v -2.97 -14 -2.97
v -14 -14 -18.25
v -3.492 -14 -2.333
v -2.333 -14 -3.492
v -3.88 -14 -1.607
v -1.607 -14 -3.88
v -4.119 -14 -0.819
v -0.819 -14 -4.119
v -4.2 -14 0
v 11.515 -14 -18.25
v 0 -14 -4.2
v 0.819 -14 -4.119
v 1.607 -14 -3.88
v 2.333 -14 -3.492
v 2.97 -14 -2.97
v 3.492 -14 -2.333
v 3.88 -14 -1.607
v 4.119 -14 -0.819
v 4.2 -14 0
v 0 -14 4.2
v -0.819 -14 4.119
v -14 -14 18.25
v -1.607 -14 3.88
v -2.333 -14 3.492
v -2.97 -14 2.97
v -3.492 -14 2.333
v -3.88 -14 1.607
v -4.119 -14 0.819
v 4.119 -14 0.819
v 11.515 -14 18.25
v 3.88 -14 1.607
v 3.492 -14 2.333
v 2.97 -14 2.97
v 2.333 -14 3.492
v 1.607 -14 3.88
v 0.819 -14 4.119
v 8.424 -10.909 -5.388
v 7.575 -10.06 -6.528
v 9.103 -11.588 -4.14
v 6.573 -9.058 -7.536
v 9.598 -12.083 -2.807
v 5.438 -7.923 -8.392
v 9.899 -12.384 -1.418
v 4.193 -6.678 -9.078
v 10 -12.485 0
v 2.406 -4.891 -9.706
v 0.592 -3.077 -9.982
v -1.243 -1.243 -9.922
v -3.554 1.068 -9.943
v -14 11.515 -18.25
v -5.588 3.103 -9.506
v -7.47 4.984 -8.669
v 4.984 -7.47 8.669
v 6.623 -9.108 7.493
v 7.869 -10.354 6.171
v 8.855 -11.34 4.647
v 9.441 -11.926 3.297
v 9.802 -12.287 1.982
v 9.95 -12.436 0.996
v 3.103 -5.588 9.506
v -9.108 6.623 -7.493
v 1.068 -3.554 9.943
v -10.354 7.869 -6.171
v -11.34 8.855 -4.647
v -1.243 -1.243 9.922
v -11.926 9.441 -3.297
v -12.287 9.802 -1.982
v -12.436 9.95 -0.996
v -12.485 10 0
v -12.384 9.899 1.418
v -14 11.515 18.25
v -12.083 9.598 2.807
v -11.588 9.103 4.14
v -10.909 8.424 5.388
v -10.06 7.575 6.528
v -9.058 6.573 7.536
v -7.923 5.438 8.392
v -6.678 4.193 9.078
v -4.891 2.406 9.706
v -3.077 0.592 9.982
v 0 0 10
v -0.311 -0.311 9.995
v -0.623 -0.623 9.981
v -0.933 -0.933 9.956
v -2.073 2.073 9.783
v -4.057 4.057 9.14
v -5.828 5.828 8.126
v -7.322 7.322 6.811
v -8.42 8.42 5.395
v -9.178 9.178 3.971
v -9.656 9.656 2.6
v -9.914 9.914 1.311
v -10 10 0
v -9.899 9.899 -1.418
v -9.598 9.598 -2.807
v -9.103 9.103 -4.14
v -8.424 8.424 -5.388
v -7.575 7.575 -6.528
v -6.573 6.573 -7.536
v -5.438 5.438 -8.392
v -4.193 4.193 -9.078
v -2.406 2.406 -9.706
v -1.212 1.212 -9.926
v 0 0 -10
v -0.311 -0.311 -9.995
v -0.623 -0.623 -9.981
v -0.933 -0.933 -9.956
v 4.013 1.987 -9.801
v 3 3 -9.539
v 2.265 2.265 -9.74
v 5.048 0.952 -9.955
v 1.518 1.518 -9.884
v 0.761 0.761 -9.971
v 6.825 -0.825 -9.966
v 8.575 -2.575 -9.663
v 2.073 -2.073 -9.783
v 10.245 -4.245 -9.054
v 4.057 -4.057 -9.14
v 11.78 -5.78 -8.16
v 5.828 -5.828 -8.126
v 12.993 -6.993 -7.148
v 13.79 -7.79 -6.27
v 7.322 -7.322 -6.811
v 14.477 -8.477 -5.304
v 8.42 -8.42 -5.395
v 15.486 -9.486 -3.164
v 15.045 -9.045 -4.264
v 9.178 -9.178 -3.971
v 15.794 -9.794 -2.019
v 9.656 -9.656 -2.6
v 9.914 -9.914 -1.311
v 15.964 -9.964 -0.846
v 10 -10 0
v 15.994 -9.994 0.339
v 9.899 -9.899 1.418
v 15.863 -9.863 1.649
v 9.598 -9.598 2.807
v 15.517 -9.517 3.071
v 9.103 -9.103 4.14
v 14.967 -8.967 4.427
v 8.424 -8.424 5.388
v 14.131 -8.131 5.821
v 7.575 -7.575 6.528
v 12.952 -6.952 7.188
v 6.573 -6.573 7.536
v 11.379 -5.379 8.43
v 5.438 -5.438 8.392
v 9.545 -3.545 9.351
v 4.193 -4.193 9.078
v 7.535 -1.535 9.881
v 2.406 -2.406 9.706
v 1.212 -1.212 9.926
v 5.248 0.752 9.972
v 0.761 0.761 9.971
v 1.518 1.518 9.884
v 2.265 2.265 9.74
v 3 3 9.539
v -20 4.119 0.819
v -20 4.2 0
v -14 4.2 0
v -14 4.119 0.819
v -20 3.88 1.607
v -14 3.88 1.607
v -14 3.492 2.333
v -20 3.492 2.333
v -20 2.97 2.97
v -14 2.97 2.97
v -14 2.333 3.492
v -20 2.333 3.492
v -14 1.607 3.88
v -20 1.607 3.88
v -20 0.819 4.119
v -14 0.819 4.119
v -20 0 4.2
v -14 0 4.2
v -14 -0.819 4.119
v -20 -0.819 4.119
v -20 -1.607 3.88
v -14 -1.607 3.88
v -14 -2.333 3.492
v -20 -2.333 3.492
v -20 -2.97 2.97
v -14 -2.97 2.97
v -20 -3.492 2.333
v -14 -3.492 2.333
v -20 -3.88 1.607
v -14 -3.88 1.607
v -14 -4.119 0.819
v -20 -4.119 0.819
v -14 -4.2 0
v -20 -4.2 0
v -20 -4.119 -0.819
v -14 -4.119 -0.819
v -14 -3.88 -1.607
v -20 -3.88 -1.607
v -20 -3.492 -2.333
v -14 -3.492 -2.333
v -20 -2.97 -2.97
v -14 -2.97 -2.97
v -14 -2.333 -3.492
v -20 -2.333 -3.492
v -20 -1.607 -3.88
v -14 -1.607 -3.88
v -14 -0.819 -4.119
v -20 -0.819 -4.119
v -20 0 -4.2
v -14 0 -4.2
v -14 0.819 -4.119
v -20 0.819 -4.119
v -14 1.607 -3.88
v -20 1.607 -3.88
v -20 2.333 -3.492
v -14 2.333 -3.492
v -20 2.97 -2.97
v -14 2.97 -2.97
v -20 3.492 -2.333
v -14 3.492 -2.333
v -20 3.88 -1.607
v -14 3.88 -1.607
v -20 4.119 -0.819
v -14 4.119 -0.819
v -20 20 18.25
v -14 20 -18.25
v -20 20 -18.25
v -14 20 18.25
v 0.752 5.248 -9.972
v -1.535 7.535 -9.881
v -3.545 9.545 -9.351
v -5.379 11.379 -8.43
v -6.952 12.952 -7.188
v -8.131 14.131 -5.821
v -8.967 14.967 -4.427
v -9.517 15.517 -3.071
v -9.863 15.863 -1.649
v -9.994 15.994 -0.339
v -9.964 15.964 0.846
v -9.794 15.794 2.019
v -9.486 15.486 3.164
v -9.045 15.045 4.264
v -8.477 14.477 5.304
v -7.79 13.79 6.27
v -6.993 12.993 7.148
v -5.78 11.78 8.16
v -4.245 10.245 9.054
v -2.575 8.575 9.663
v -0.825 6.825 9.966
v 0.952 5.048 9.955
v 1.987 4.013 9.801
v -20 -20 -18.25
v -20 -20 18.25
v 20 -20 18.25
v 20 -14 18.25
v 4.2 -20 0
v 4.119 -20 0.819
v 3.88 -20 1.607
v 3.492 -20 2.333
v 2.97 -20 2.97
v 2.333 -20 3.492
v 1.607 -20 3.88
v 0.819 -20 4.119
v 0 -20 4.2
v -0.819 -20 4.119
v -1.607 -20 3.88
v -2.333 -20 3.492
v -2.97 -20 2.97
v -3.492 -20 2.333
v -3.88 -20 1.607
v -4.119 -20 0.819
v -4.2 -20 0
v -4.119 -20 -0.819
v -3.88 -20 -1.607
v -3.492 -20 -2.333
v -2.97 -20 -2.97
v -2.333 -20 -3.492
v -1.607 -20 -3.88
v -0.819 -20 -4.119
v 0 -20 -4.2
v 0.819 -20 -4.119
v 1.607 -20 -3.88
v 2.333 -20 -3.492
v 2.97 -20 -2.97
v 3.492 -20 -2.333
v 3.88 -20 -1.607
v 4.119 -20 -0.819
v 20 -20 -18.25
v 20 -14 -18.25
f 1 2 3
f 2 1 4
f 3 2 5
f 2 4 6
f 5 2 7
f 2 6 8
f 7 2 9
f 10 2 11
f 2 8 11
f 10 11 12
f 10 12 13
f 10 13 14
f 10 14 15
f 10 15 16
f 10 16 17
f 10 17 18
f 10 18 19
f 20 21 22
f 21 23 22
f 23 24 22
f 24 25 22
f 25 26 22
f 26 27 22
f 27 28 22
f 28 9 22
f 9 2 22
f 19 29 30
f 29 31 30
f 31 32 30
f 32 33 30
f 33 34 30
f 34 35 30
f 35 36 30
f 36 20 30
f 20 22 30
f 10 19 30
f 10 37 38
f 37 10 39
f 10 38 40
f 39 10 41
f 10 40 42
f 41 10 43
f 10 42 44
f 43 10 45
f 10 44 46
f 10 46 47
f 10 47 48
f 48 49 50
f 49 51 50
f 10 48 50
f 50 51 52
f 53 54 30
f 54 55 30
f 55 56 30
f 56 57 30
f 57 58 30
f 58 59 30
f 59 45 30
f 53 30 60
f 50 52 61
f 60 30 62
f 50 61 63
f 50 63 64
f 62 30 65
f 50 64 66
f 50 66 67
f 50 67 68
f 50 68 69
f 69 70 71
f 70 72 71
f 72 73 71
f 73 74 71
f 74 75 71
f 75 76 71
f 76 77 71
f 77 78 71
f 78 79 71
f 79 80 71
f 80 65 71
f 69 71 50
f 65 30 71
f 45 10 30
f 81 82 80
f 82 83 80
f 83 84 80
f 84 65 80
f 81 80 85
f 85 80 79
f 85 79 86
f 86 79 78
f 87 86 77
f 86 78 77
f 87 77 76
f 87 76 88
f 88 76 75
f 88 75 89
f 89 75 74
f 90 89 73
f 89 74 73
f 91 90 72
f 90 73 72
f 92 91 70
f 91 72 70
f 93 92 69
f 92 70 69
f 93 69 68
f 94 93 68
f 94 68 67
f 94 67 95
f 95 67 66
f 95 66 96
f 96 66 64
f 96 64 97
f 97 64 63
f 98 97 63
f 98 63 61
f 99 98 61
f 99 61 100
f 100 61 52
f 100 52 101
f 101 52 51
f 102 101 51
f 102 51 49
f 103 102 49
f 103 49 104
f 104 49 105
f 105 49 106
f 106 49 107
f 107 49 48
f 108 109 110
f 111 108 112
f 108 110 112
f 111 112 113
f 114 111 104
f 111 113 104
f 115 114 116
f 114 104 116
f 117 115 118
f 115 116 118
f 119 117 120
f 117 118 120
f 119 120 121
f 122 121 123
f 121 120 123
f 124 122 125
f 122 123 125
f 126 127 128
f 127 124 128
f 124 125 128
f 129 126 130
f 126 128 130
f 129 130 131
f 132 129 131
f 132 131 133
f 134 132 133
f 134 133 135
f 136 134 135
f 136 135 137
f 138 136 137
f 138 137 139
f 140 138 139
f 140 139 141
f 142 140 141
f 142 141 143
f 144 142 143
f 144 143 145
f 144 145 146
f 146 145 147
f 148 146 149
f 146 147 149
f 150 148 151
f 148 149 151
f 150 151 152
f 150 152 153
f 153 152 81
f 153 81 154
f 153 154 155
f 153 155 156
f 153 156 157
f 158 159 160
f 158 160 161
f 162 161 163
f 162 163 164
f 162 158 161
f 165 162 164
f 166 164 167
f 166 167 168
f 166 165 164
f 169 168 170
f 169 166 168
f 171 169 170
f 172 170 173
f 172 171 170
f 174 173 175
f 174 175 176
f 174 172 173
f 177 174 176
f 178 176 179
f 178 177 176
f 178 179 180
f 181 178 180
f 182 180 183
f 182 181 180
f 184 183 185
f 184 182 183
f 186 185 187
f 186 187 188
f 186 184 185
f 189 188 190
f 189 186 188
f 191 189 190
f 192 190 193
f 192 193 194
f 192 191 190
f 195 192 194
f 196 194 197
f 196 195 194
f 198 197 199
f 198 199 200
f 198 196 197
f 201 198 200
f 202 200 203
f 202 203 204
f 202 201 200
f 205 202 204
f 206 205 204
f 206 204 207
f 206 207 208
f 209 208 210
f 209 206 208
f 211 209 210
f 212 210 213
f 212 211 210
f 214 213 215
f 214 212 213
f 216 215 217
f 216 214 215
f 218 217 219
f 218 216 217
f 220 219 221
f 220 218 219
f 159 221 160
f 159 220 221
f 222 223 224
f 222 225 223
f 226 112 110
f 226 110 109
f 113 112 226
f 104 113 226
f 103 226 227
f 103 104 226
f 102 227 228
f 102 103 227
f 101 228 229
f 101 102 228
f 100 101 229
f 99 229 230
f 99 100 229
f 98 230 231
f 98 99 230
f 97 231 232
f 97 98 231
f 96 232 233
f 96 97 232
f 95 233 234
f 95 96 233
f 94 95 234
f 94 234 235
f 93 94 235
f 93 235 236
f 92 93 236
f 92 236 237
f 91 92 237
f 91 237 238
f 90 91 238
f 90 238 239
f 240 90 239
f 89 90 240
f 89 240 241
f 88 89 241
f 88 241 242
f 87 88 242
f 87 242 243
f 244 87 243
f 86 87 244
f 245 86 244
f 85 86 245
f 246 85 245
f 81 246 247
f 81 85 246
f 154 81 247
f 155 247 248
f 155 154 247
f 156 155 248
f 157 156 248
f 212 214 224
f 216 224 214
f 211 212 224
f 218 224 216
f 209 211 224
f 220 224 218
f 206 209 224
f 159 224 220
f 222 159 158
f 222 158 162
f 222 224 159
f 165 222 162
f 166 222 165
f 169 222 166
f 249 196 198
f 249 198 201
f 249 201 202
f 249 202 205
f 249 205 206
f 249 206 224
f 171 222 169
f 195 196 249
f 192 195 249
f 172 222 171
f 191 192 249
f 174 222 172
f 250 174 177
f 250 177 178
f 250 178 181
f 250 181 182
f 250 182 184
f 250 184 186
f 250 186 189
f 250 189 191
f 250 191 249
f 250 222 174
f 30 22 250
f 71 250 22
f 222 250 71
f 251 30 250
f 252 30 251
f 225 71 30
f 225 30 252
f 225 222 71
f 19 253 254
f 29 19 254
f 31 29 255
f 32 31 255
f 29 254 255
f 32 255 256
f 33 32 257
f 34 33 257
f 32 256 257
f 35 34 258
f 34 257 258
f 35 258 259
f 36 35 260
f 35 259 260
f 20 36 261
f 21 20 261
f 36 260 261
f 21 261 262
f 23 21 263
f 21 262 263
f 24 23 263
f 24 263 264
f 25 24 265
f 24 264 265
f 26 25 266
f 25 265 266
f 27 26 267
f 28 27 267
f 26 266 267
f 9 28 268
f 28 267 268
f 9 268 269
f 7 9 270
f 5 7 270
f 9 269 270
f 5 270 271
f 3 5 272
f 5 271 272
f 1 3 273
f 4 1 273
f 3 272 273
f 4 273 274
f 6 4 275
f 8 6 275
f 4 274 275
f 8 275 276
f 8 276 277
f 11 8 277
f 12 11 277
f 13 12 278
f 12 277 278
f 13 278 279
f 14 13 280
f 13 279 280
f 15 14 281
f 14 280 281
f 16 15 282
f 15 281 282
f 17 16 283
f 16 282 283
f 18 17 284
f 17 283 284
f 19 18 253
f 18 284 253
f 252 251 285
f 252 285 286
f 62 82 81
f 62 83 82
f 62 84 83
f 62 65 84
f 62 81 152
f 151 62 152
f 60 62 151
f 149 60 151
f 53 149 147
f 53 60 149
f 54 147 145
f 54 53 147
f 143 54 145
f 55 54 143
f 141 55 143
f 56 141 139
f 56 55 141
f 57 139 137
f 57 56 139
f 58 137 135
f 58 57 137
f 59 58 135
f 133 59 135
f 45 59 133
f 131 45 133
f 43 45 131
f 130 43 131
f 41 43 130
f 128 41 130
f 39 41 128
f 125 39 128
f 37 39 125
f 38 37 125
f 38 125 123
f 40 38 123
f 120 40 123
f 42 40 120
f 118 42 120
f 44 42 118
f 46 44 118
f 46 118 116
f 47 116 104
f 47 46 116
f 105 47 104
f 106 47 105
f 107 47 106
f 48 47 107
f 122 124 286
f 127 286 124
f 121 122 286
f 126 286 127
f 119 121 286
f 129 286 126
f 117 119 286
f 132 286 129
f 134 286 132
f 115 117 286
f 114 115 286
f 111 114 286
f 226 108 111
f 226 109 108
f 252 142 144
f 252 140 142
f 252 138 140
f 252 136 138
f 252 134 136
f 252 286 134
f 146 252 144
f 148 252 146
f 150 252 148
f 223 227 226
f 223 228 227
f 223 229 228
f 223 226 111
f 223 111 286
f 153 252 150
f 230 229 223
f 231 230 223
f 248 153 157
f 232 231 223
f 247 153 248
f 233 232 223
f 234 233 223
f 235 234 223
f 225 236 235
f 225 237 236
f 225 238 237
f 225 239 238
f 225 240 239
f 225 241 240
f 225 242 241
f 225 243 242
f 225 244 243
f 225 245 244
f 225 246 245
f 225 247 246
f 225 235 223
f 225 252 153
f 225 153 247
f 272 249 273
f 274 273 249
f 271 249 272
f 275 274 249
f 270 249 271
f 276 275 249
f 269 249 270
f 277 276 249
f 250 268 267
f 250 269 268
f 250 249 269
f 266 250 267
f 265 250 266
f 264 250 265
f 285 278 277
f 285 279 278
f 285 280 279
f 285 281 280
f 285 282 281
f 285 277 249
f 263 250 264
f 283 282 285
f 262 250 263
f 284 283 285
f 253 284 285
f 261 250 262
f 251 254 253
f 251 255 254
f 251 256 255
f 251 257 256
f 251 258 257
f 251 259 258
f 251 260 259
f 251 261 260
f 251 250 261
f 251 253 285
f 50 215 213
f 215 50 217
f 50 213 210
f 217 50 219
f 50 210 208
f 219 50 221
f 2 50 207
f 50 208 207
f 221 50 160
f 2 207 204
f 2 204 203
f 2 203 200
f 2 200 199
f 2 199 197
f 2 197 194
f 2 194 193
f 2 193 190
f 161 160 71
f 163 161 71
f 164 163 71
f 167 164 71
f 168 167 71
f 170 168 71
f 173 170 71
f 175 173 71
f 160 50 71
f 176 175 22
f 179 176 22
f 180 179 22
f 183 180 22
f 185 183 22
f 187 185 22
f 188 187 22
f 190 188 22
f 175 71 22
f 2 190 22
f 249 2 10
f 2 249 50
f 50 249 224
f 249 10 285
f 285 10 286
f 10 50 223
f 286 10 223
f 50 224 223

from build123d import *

# Parameters (mm, degrees)
BOSS_EXTRUDE1_DEPTH      = 18.25
BOSS_EXTRUDE1_DEPTH_BACK = 18.25
SKETCH4_R                = 4.2
CUT_EXTRUDE1_DEPTH       = 6
SKETCH6_R                = 10
CUT_EXTRUDE2_DEPTH       = 35


with BuildPart() as part:
    # Sketch2 → Boss-Extrude1 (new body, two sides)
    with BuildSketch(Plane.XY) as boss_extrude1_sk:
        Polygon((-20, 20), (-20, -20), (20, -20), (20, -14), (-14, 20), align=None)
        Polygon((-14, 11.514718626), (-14, -14), (11.514718626, -14), align=None, mode=Mode.SUBTRACT)
    extrude(amount=BOSS_EXTRUDE1_DEPTH)
    extrude(boss_extrude1_sk.sketch, amount=-BOSS_EXTRUDE1_DEPTH_BACK)

    # Sketch4 → Cut-Extrude1 (cut)
    with BuildSketch(Plane.XZ.offset(20)):
        Circle(SKETCH4_R)
    cut_extrude1 = extrude(amount=-CUT_EXTRUDE1_DEPTH, mode=Mode.SUBTRACT)

    # Sketch6 → Cut-Extrude2 (cut, through all)
    with BuildSketch(Plane(origin=(0, -14, 0), x_dir=(1, 0, 0), z_dir=(0, 1, 0))):
        Circle(SKETCH6_R)
    cut_extrude2 = extrude(amount=CUT_EXTRUDE2_DEPTH, mode=Mode.SUBTRACT)

    # Mirror1: Cut-Extrude1, Cut-Extrude2 across plane
    add(cut_extrude1.mirror(Plane(origin=(0, 0, 0), x_dir=(0, 0, 1), z_dir=(0.707106781, -0.707106781, 0))), mode=Mode.SUBTRACT)
    add(cut_extrude2.mirror(Plane(origin=(0, 0, 0), x_dir=(0, 0, 1), z_dir=(0.707106781, -0.707106781, 0))), mode=Mode.SUBTRACT)


solid = part.part
